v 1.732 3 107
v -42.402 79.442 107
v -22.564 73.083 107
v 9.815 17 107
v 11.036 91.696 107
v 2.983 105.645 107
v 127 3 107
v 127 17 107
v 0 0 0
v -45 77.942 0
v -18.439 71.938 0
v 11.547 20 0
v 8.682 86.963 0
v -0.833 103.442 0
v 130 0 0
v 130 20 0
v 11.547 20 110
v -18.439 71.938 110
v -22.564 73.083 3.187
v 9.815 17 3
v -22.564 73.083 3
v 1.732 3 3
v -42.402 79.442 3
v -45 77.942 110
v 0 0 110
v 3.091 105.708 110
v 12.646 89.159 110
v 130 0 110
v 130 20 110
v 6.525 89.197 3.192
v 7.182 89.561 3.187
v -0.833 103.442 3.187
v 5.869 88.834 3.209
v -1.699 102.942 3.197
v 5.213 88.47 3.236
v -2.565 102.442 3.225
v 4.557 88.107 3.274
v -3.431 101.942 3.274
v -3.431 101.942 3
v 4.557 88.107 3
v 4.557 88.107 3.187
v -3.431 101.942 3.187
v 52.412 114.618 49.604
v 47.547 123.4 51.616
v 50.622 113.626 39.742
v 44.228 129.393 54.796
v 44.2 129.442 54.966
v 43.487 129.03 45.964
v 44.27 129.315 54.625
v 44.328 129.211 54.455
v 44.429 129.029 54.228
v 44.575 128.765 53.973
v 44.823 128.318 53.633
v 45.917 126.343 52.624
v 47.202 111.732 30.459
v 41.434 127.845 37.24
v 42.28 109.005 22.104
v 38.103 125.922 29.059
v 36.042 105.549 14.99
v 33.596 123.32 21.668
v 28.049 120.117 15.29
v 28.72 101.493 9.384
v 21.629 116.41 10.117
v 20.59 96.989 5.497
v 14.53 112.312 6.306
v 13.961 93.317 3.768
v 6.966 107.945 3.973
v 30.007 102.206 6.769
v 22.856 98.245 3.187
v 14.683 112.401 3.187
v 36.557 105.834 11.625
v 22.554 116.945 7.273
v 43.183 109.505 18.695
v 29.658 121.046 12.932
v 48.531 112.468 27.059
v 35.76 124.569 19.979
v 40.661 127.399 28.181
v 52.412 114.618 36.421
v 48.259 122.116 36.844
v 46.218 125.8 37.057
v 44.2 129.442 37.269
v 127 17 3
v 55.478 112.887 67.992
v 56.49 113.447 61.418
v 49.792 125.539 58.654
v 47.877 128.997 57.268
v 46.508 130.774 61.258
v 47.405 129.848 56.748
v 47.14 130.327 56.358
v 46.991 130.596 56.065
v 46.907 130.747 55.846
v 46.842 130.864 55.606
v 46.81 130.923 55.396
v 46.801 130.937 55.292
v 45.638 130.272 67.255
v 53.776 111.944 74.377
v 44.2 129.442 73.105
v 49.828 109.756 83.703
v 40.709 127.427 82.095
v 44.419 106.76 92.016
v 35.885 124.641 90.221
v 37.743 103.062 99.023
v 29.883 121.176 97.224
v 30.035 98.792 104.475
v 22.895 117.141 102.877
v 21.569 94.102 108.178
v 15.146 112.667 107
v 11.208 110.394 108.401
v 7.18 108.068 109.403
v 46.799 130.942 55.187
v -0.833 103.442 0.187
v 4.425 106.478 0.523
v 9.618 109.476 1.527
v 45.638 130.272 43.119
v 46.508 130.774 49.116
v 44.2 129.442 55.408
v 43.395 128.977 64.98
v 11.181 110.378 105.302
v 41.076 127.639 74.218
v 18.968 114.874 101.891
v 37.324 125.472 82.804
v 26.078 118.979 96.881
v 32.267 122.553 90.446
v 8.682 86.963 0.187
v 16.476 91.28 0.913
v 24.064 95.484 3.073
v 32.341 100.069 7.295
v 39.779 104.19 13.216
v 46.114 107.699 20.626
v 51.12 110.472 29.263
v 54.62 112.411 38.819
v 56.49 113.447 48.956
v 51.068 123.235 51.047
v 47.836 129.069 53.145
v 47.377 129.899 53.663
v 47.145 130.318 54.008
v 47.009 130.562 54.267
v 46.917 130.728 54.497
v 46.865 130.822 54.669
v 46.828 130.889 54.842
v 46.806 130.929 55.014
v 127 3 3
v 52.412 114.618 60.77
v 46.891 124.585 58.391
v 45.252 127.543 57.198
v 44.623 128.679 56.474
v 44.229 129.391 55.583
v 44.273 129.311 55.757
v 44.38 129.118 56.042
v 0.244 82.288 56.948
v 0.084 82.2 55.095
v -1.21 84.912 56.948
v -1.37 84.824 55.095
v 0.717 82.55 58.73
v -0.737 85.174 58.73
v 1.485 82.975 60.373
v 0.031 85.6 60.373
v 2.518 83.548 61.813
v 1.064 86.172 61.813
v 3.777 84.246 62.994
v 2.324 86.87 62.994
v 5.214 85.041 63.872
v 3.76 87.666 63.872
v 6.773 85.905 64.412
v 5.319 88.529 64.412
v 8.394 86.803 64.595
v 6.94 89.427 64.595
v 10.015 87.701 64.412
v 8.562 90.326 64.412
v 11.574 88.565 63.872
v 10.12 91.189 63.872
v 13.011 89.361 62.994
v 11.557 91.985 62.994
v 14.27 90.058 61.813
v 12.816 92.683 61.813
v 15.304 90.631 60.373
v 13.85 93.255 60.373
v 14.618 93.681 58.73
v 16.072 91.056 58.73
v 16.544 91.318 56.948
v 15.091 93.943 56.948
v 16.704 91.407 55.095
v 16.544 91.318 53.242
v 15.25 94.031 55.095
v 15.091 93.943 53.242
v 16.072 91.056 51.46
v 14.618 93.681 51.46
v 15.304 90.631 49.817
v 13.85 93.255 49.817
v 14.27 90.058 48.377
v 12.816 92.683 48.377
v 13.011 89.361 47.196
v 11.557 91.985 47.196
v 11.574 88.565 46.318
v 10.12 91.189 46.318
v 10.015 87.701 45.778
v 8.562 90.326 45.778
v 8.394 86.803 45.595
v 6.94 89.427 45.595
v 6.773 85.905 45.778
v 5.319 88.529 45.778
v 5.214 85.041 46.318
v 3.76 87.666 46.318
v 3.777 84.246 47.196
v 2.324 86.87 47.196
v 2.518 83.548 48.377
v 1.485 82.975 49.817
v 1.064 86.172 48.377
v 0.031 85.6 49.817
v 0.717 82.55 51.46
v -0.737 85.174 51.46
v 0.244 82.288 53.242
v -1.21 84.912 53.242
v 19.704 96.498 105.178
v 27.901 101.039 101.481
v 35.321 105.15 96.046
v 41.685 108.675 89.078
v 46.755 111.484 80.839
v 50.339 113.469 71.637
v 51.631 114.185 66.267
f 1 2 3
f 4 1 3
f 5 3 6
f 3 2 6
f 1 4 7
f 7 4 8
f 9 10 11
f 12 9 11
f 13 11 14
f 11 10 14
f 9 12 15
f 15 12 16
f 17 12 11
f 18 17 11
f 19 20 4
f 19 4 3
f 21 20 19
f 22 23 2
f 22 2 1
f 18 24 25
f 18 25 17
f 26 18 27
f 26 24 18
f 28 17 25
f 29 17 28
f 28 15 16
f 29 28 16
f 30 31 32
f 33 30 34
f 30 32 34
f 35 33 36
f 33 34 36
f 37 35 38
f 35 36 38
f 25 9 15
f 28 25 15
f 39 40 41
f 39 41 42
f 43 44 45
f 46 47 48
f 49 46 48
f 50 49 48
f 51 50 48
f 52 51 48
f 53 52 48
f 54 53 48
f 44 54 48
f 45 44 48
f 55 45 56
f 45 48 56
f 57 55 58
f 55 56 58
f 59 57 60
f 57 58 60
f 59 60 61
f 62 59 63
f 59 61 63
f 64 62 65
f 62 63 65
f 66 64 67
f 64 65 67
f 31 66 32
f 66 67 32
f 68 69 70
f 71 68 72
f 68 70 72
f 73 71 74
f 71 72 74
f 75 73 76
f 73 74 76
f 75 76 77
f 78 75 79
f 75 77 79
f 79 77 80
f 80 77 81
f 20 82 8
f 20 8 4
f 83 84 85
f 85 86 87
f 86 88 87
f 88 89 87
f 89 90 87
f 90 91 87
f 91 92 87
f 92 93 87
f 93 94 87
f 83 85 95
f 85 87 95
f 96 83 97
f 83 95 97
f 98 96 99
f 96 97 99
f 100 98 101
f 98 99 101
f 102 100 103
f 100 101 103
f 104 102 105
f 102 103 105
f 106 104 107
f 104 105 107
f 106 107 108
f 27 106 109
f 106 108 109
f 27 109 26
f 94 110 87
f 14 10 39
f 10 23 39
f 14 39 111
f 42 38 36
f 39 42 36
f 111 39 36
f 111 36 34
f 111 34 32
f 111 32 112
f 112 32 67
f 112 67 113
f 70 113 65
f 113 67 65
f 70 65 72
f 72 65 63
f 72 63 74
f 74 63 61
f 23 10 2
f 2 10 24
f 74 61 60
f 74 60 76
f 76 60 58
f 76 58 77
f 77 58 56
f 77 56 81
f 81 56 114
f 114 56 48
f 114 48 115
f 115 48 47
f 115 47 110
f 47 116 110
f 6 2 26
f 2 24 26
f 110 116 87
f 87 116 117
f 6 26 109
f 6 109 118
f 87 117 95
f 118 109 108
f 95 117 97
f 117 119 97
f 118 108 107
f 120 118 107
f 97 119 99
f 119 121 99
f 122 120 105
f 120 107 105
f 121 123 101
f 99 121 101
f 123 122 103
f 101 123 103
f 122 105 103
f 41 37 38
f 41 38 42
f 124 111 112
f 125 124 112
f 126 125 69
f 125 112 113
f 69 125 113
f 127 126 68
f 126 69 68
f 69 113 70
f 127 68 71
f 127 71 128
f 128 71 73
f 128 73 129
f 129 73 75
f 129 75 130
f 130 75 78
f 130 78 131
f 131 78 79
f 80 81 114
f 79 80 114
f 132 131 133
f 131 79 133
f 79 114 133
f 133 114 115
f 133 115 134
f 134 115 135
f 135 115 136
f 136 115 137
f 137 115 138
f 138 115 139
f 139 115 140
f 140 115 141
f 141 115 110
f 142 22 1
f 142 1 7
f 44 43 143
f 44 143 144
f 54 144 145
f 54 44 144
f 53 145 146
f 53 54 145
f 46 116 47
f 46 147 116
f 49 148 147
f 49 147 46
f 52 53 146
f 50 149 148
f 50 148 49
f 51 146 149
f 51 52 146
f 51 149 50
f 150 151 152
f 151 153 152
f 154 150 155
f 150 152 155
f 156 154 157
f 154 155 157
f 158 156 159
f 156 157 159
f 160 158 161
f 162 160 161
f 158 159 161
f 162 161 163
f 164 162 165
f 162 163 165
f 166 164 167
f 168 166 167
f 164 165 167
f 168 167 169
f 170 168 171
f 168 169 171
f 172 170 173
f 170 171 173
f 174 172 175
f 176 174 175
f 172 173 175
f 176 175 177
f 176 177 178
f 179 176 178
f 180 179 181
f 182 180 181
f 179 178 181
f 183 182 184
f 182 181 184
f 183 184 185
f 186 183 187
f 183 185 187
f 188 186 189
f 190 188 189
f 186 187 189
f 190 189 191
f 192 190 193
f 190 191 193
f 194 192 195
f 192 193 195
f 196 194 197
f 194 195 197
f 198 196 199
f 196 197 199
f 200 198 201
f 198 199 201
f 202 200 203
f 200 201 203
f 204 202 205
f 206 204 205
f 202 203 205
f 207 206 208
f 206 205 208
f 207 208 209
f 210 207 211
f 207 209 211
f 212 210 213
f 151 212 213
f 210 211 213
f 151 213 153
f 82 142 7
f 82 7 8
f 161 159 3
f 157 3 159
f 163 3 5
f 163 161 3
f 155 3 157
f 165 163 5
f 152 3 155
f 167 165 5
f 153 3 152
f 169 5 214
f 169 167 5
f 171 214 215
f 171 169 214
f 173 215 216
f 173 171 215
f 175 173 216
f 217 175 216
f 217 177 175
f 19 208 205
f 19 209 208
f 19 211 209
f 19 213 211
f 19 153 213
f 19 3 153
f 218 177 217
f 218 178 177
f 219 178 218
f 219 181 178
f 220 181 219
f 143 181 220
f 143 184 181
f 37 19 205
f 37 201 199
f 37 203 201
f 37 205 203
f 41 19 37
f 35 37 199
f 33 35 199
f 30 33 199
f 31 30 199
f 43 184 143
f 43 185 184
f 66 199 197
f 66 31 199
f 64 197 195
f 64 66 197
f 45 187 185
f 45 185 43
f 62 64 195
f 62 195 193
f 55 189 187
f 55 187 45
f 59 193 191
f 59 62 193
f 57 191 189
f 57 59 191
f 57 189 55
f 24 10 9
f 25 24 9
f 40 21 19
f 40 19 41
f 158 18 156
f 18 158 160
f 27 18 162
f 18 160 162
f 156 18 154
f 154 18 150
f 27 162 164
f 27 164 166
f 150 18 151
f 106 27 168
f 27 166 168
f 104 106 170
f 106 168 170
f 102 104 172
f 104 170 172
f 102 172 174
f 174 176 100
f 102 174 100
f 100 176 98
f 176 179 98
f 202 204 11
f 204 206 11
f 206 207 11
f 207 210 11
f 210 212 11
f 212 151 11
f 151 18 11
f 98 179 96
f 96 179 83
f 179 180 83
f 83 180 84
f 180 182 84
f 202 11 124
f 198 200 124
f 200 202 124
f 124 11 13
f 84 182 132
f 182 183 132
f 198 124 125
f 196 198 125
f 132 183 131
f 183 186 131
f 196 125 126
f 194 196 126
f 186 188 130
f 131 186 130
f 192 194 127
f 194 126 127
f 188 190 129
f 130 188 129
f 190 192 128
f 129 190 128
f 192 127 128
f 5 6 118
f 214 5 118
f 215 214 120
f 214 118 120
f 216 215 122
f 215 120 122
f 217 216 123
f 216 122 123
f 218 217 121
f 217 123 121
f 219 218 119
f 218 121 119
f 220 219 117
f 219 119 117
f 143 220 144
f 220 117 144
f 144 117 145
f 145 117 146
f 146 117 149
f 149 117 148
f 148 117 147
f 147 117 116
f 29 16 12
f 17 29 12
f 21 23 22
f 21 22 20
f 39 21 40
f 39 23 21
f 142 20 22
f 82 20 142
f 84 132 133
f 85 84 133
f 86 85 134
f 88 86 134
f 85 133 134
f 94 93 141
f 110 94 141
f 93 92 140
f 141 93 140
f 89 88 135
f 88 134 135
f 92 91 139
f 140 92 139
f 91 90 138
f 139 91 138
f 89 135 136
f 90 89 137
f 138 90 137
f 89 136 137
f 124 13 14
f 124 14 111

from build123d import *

# Parameters (mm, degrees)
SALIENTE_EXTRUIR1_DEPTH = 110
CORTAR_EXTRUIR9_DEPTH   = 55
VACIADO3_START          = 3.186974639
VACIADO3_DEPTH          = 103.813025361
VACIADO3_START_2        = 3
VACIADO3_2_DEPTH        = 0.273585229
VACIADO3_START_3        = -90
VACIADO3_3_DEPTH        = 16.944212752
CROQUIS7_R              = 9.5
CORTAR_EXTRUIR10_DEPTH  = 55


with BuildPart() as part:
    # Croquis1 → Saliente-Extruir1 (new body)
    with BuildSketch(Plane.XY):
        Polygon((0, 0), (130, 0), (130, 20), (11.547005384, 20), (-18.439456819, 71.938076074), (56.490425623, 113.447420953), (46.798692801, 130.942286341), (-45, 77.942286341), align=None)
    extrude(amount=SALIENTE_EXTRUIR1_DEPTH)

    # Croquis6 → Cortar-Extruir9 (cut, symmetric)
    with BuildSketch(Plane(origin=(-45, 77.942286341, 0), x_dir=(0.8660254037844362, 0.5000000000000044, 0), z_dir=(-0.5000000000000043, 0.866025403784436, 0))):
        with BuildLine():
            Line((51, -110.186974639), (51, -125.465118776))
            Line((51, -125.465118776), (118.324922333, -125.465118776))
            Line((118.324922333, -125.465118776), (118.324922333, 14.437296871))
            Line((118.324922333, 14.437296871), (51, 14.437296871))
            Line((51, 14.437296871), (51, -0.186974639))
            ThreePointArc((51, -0.186974639), (106, -55.186974639), (51, -110.186974639))
        make_face()
    extrude(amount=CORTAR_EXTRUIR9_DEPTH, both=True, mode=Mode.SUBTRACT)

    # Vaciado3: read off the stored shape, not the designer's step
    # Vaciado3 outline → Vaciado3 (cut)
    with BuildSketch(Plane.XY.offset(VACIADO3_START)):
        Polygon((52.412435892, 114.617890838), (44.200209183, 129.442051124), (-42.401923789, 79.442286341), (1.732050808, 3), (127, 3), (127, 17), (9.814954576, 17), (-22.564333351, 73.082571803), align=None)
    extrude(amount=VACIADO3_DEPTH, mode=Mode.SUBTRACT)

    # Vaciado3 2 outline → Vaciado3 2 (cut)
    with BuildSketch(Plane.XY.offset(VACIADO3_START_2)):
        Polygon((4.556960249, 88.107113321), (-3.430780618, 101.942286341), (-42.401923789, 79.442286341), (1.732050808, 3), (127, 3), (127, 17), (9.814954576, 17), (-22.564333351, 73.082571803), align=None)
    extrude(amount=VACIADO3_2_DEPTH, mode=Mode.SUBTRACT)

    # Vaciado3 3 outline → Vaciado3 3 (add)
    with BuildSketch(Plane(origin=(0, 0, 0), x_dir=(0.8660254037844362, 0.5000000000000042, 0), z_dir=(0.5000000000000042, -0.8660254037844363, 0)).offset(VACIADO3_START_3)):
        with BuildLine():
            ThreePointArc((68.916472868, 3.186974639), (89.973499173, 16.3789038), (103.075739879, 37.491853388))
            Line((103.075739879, 37.491853388), (103.000470437, 55.186974639))
            Line((103.000470437, 55.186974639), (102.999529567, 54.965785108))
            ThreePointArc((102.999529567, 54.965785108), (87.691266975, 18.339302693), (51, 3.186974639))
            Line((51, 3.186974639), (68.916472868, 3.186974639))
        make_face()
        with BuildLine():
            Line((103.000470437, 55.186974639), (103.075739879, 72.882095888))
            ThreePointArc((103.075739879, 72.882095888), (90.172508138, 93.794157987), (69.450214169, 107))
            Line((69.450214169, 107), (55.405723879, 107))
            ThreePointArc((55.405723879, 107), (89.220642789, 90.445767369), (102.999529567, 55.408164169))
            Line((102.999529567, 55.408164169), (103.000470437, 55.186974639))
        make_face()
        with BuildLine():
            Line((48, 3.186974639), (51, 3.186974639))
            ThreePointArc((51, 3.186974639), (49.499375014, 3.208631796), (48, 3.273585229))
            Line((48, 3.273585229), (48, 3.186974639))
        make_face()
    extrude(amount=VACIADO3_3_DEPTH)

    # Croquis7 → Cortar-Extruir10 (cut, symmetric)
    with BuildSketch(Plane(origin=(-36.277542983, 65.485784921, 0), x_dir=(0.874743269355894, 0.4845866410834722, 0), z_dir=(-0.4845866410834722, 0.874743269355894, 0))):
        with Locations(Location((49.406343615, -55.095, 0), (0, 0, 180))):
            Circle(CROQUIS7_R)
    extrude(amount=CORTAR_EXTRUIR10_DEPTH, both=True, mode=Mode.SUBTRACT)


solid = part.part
